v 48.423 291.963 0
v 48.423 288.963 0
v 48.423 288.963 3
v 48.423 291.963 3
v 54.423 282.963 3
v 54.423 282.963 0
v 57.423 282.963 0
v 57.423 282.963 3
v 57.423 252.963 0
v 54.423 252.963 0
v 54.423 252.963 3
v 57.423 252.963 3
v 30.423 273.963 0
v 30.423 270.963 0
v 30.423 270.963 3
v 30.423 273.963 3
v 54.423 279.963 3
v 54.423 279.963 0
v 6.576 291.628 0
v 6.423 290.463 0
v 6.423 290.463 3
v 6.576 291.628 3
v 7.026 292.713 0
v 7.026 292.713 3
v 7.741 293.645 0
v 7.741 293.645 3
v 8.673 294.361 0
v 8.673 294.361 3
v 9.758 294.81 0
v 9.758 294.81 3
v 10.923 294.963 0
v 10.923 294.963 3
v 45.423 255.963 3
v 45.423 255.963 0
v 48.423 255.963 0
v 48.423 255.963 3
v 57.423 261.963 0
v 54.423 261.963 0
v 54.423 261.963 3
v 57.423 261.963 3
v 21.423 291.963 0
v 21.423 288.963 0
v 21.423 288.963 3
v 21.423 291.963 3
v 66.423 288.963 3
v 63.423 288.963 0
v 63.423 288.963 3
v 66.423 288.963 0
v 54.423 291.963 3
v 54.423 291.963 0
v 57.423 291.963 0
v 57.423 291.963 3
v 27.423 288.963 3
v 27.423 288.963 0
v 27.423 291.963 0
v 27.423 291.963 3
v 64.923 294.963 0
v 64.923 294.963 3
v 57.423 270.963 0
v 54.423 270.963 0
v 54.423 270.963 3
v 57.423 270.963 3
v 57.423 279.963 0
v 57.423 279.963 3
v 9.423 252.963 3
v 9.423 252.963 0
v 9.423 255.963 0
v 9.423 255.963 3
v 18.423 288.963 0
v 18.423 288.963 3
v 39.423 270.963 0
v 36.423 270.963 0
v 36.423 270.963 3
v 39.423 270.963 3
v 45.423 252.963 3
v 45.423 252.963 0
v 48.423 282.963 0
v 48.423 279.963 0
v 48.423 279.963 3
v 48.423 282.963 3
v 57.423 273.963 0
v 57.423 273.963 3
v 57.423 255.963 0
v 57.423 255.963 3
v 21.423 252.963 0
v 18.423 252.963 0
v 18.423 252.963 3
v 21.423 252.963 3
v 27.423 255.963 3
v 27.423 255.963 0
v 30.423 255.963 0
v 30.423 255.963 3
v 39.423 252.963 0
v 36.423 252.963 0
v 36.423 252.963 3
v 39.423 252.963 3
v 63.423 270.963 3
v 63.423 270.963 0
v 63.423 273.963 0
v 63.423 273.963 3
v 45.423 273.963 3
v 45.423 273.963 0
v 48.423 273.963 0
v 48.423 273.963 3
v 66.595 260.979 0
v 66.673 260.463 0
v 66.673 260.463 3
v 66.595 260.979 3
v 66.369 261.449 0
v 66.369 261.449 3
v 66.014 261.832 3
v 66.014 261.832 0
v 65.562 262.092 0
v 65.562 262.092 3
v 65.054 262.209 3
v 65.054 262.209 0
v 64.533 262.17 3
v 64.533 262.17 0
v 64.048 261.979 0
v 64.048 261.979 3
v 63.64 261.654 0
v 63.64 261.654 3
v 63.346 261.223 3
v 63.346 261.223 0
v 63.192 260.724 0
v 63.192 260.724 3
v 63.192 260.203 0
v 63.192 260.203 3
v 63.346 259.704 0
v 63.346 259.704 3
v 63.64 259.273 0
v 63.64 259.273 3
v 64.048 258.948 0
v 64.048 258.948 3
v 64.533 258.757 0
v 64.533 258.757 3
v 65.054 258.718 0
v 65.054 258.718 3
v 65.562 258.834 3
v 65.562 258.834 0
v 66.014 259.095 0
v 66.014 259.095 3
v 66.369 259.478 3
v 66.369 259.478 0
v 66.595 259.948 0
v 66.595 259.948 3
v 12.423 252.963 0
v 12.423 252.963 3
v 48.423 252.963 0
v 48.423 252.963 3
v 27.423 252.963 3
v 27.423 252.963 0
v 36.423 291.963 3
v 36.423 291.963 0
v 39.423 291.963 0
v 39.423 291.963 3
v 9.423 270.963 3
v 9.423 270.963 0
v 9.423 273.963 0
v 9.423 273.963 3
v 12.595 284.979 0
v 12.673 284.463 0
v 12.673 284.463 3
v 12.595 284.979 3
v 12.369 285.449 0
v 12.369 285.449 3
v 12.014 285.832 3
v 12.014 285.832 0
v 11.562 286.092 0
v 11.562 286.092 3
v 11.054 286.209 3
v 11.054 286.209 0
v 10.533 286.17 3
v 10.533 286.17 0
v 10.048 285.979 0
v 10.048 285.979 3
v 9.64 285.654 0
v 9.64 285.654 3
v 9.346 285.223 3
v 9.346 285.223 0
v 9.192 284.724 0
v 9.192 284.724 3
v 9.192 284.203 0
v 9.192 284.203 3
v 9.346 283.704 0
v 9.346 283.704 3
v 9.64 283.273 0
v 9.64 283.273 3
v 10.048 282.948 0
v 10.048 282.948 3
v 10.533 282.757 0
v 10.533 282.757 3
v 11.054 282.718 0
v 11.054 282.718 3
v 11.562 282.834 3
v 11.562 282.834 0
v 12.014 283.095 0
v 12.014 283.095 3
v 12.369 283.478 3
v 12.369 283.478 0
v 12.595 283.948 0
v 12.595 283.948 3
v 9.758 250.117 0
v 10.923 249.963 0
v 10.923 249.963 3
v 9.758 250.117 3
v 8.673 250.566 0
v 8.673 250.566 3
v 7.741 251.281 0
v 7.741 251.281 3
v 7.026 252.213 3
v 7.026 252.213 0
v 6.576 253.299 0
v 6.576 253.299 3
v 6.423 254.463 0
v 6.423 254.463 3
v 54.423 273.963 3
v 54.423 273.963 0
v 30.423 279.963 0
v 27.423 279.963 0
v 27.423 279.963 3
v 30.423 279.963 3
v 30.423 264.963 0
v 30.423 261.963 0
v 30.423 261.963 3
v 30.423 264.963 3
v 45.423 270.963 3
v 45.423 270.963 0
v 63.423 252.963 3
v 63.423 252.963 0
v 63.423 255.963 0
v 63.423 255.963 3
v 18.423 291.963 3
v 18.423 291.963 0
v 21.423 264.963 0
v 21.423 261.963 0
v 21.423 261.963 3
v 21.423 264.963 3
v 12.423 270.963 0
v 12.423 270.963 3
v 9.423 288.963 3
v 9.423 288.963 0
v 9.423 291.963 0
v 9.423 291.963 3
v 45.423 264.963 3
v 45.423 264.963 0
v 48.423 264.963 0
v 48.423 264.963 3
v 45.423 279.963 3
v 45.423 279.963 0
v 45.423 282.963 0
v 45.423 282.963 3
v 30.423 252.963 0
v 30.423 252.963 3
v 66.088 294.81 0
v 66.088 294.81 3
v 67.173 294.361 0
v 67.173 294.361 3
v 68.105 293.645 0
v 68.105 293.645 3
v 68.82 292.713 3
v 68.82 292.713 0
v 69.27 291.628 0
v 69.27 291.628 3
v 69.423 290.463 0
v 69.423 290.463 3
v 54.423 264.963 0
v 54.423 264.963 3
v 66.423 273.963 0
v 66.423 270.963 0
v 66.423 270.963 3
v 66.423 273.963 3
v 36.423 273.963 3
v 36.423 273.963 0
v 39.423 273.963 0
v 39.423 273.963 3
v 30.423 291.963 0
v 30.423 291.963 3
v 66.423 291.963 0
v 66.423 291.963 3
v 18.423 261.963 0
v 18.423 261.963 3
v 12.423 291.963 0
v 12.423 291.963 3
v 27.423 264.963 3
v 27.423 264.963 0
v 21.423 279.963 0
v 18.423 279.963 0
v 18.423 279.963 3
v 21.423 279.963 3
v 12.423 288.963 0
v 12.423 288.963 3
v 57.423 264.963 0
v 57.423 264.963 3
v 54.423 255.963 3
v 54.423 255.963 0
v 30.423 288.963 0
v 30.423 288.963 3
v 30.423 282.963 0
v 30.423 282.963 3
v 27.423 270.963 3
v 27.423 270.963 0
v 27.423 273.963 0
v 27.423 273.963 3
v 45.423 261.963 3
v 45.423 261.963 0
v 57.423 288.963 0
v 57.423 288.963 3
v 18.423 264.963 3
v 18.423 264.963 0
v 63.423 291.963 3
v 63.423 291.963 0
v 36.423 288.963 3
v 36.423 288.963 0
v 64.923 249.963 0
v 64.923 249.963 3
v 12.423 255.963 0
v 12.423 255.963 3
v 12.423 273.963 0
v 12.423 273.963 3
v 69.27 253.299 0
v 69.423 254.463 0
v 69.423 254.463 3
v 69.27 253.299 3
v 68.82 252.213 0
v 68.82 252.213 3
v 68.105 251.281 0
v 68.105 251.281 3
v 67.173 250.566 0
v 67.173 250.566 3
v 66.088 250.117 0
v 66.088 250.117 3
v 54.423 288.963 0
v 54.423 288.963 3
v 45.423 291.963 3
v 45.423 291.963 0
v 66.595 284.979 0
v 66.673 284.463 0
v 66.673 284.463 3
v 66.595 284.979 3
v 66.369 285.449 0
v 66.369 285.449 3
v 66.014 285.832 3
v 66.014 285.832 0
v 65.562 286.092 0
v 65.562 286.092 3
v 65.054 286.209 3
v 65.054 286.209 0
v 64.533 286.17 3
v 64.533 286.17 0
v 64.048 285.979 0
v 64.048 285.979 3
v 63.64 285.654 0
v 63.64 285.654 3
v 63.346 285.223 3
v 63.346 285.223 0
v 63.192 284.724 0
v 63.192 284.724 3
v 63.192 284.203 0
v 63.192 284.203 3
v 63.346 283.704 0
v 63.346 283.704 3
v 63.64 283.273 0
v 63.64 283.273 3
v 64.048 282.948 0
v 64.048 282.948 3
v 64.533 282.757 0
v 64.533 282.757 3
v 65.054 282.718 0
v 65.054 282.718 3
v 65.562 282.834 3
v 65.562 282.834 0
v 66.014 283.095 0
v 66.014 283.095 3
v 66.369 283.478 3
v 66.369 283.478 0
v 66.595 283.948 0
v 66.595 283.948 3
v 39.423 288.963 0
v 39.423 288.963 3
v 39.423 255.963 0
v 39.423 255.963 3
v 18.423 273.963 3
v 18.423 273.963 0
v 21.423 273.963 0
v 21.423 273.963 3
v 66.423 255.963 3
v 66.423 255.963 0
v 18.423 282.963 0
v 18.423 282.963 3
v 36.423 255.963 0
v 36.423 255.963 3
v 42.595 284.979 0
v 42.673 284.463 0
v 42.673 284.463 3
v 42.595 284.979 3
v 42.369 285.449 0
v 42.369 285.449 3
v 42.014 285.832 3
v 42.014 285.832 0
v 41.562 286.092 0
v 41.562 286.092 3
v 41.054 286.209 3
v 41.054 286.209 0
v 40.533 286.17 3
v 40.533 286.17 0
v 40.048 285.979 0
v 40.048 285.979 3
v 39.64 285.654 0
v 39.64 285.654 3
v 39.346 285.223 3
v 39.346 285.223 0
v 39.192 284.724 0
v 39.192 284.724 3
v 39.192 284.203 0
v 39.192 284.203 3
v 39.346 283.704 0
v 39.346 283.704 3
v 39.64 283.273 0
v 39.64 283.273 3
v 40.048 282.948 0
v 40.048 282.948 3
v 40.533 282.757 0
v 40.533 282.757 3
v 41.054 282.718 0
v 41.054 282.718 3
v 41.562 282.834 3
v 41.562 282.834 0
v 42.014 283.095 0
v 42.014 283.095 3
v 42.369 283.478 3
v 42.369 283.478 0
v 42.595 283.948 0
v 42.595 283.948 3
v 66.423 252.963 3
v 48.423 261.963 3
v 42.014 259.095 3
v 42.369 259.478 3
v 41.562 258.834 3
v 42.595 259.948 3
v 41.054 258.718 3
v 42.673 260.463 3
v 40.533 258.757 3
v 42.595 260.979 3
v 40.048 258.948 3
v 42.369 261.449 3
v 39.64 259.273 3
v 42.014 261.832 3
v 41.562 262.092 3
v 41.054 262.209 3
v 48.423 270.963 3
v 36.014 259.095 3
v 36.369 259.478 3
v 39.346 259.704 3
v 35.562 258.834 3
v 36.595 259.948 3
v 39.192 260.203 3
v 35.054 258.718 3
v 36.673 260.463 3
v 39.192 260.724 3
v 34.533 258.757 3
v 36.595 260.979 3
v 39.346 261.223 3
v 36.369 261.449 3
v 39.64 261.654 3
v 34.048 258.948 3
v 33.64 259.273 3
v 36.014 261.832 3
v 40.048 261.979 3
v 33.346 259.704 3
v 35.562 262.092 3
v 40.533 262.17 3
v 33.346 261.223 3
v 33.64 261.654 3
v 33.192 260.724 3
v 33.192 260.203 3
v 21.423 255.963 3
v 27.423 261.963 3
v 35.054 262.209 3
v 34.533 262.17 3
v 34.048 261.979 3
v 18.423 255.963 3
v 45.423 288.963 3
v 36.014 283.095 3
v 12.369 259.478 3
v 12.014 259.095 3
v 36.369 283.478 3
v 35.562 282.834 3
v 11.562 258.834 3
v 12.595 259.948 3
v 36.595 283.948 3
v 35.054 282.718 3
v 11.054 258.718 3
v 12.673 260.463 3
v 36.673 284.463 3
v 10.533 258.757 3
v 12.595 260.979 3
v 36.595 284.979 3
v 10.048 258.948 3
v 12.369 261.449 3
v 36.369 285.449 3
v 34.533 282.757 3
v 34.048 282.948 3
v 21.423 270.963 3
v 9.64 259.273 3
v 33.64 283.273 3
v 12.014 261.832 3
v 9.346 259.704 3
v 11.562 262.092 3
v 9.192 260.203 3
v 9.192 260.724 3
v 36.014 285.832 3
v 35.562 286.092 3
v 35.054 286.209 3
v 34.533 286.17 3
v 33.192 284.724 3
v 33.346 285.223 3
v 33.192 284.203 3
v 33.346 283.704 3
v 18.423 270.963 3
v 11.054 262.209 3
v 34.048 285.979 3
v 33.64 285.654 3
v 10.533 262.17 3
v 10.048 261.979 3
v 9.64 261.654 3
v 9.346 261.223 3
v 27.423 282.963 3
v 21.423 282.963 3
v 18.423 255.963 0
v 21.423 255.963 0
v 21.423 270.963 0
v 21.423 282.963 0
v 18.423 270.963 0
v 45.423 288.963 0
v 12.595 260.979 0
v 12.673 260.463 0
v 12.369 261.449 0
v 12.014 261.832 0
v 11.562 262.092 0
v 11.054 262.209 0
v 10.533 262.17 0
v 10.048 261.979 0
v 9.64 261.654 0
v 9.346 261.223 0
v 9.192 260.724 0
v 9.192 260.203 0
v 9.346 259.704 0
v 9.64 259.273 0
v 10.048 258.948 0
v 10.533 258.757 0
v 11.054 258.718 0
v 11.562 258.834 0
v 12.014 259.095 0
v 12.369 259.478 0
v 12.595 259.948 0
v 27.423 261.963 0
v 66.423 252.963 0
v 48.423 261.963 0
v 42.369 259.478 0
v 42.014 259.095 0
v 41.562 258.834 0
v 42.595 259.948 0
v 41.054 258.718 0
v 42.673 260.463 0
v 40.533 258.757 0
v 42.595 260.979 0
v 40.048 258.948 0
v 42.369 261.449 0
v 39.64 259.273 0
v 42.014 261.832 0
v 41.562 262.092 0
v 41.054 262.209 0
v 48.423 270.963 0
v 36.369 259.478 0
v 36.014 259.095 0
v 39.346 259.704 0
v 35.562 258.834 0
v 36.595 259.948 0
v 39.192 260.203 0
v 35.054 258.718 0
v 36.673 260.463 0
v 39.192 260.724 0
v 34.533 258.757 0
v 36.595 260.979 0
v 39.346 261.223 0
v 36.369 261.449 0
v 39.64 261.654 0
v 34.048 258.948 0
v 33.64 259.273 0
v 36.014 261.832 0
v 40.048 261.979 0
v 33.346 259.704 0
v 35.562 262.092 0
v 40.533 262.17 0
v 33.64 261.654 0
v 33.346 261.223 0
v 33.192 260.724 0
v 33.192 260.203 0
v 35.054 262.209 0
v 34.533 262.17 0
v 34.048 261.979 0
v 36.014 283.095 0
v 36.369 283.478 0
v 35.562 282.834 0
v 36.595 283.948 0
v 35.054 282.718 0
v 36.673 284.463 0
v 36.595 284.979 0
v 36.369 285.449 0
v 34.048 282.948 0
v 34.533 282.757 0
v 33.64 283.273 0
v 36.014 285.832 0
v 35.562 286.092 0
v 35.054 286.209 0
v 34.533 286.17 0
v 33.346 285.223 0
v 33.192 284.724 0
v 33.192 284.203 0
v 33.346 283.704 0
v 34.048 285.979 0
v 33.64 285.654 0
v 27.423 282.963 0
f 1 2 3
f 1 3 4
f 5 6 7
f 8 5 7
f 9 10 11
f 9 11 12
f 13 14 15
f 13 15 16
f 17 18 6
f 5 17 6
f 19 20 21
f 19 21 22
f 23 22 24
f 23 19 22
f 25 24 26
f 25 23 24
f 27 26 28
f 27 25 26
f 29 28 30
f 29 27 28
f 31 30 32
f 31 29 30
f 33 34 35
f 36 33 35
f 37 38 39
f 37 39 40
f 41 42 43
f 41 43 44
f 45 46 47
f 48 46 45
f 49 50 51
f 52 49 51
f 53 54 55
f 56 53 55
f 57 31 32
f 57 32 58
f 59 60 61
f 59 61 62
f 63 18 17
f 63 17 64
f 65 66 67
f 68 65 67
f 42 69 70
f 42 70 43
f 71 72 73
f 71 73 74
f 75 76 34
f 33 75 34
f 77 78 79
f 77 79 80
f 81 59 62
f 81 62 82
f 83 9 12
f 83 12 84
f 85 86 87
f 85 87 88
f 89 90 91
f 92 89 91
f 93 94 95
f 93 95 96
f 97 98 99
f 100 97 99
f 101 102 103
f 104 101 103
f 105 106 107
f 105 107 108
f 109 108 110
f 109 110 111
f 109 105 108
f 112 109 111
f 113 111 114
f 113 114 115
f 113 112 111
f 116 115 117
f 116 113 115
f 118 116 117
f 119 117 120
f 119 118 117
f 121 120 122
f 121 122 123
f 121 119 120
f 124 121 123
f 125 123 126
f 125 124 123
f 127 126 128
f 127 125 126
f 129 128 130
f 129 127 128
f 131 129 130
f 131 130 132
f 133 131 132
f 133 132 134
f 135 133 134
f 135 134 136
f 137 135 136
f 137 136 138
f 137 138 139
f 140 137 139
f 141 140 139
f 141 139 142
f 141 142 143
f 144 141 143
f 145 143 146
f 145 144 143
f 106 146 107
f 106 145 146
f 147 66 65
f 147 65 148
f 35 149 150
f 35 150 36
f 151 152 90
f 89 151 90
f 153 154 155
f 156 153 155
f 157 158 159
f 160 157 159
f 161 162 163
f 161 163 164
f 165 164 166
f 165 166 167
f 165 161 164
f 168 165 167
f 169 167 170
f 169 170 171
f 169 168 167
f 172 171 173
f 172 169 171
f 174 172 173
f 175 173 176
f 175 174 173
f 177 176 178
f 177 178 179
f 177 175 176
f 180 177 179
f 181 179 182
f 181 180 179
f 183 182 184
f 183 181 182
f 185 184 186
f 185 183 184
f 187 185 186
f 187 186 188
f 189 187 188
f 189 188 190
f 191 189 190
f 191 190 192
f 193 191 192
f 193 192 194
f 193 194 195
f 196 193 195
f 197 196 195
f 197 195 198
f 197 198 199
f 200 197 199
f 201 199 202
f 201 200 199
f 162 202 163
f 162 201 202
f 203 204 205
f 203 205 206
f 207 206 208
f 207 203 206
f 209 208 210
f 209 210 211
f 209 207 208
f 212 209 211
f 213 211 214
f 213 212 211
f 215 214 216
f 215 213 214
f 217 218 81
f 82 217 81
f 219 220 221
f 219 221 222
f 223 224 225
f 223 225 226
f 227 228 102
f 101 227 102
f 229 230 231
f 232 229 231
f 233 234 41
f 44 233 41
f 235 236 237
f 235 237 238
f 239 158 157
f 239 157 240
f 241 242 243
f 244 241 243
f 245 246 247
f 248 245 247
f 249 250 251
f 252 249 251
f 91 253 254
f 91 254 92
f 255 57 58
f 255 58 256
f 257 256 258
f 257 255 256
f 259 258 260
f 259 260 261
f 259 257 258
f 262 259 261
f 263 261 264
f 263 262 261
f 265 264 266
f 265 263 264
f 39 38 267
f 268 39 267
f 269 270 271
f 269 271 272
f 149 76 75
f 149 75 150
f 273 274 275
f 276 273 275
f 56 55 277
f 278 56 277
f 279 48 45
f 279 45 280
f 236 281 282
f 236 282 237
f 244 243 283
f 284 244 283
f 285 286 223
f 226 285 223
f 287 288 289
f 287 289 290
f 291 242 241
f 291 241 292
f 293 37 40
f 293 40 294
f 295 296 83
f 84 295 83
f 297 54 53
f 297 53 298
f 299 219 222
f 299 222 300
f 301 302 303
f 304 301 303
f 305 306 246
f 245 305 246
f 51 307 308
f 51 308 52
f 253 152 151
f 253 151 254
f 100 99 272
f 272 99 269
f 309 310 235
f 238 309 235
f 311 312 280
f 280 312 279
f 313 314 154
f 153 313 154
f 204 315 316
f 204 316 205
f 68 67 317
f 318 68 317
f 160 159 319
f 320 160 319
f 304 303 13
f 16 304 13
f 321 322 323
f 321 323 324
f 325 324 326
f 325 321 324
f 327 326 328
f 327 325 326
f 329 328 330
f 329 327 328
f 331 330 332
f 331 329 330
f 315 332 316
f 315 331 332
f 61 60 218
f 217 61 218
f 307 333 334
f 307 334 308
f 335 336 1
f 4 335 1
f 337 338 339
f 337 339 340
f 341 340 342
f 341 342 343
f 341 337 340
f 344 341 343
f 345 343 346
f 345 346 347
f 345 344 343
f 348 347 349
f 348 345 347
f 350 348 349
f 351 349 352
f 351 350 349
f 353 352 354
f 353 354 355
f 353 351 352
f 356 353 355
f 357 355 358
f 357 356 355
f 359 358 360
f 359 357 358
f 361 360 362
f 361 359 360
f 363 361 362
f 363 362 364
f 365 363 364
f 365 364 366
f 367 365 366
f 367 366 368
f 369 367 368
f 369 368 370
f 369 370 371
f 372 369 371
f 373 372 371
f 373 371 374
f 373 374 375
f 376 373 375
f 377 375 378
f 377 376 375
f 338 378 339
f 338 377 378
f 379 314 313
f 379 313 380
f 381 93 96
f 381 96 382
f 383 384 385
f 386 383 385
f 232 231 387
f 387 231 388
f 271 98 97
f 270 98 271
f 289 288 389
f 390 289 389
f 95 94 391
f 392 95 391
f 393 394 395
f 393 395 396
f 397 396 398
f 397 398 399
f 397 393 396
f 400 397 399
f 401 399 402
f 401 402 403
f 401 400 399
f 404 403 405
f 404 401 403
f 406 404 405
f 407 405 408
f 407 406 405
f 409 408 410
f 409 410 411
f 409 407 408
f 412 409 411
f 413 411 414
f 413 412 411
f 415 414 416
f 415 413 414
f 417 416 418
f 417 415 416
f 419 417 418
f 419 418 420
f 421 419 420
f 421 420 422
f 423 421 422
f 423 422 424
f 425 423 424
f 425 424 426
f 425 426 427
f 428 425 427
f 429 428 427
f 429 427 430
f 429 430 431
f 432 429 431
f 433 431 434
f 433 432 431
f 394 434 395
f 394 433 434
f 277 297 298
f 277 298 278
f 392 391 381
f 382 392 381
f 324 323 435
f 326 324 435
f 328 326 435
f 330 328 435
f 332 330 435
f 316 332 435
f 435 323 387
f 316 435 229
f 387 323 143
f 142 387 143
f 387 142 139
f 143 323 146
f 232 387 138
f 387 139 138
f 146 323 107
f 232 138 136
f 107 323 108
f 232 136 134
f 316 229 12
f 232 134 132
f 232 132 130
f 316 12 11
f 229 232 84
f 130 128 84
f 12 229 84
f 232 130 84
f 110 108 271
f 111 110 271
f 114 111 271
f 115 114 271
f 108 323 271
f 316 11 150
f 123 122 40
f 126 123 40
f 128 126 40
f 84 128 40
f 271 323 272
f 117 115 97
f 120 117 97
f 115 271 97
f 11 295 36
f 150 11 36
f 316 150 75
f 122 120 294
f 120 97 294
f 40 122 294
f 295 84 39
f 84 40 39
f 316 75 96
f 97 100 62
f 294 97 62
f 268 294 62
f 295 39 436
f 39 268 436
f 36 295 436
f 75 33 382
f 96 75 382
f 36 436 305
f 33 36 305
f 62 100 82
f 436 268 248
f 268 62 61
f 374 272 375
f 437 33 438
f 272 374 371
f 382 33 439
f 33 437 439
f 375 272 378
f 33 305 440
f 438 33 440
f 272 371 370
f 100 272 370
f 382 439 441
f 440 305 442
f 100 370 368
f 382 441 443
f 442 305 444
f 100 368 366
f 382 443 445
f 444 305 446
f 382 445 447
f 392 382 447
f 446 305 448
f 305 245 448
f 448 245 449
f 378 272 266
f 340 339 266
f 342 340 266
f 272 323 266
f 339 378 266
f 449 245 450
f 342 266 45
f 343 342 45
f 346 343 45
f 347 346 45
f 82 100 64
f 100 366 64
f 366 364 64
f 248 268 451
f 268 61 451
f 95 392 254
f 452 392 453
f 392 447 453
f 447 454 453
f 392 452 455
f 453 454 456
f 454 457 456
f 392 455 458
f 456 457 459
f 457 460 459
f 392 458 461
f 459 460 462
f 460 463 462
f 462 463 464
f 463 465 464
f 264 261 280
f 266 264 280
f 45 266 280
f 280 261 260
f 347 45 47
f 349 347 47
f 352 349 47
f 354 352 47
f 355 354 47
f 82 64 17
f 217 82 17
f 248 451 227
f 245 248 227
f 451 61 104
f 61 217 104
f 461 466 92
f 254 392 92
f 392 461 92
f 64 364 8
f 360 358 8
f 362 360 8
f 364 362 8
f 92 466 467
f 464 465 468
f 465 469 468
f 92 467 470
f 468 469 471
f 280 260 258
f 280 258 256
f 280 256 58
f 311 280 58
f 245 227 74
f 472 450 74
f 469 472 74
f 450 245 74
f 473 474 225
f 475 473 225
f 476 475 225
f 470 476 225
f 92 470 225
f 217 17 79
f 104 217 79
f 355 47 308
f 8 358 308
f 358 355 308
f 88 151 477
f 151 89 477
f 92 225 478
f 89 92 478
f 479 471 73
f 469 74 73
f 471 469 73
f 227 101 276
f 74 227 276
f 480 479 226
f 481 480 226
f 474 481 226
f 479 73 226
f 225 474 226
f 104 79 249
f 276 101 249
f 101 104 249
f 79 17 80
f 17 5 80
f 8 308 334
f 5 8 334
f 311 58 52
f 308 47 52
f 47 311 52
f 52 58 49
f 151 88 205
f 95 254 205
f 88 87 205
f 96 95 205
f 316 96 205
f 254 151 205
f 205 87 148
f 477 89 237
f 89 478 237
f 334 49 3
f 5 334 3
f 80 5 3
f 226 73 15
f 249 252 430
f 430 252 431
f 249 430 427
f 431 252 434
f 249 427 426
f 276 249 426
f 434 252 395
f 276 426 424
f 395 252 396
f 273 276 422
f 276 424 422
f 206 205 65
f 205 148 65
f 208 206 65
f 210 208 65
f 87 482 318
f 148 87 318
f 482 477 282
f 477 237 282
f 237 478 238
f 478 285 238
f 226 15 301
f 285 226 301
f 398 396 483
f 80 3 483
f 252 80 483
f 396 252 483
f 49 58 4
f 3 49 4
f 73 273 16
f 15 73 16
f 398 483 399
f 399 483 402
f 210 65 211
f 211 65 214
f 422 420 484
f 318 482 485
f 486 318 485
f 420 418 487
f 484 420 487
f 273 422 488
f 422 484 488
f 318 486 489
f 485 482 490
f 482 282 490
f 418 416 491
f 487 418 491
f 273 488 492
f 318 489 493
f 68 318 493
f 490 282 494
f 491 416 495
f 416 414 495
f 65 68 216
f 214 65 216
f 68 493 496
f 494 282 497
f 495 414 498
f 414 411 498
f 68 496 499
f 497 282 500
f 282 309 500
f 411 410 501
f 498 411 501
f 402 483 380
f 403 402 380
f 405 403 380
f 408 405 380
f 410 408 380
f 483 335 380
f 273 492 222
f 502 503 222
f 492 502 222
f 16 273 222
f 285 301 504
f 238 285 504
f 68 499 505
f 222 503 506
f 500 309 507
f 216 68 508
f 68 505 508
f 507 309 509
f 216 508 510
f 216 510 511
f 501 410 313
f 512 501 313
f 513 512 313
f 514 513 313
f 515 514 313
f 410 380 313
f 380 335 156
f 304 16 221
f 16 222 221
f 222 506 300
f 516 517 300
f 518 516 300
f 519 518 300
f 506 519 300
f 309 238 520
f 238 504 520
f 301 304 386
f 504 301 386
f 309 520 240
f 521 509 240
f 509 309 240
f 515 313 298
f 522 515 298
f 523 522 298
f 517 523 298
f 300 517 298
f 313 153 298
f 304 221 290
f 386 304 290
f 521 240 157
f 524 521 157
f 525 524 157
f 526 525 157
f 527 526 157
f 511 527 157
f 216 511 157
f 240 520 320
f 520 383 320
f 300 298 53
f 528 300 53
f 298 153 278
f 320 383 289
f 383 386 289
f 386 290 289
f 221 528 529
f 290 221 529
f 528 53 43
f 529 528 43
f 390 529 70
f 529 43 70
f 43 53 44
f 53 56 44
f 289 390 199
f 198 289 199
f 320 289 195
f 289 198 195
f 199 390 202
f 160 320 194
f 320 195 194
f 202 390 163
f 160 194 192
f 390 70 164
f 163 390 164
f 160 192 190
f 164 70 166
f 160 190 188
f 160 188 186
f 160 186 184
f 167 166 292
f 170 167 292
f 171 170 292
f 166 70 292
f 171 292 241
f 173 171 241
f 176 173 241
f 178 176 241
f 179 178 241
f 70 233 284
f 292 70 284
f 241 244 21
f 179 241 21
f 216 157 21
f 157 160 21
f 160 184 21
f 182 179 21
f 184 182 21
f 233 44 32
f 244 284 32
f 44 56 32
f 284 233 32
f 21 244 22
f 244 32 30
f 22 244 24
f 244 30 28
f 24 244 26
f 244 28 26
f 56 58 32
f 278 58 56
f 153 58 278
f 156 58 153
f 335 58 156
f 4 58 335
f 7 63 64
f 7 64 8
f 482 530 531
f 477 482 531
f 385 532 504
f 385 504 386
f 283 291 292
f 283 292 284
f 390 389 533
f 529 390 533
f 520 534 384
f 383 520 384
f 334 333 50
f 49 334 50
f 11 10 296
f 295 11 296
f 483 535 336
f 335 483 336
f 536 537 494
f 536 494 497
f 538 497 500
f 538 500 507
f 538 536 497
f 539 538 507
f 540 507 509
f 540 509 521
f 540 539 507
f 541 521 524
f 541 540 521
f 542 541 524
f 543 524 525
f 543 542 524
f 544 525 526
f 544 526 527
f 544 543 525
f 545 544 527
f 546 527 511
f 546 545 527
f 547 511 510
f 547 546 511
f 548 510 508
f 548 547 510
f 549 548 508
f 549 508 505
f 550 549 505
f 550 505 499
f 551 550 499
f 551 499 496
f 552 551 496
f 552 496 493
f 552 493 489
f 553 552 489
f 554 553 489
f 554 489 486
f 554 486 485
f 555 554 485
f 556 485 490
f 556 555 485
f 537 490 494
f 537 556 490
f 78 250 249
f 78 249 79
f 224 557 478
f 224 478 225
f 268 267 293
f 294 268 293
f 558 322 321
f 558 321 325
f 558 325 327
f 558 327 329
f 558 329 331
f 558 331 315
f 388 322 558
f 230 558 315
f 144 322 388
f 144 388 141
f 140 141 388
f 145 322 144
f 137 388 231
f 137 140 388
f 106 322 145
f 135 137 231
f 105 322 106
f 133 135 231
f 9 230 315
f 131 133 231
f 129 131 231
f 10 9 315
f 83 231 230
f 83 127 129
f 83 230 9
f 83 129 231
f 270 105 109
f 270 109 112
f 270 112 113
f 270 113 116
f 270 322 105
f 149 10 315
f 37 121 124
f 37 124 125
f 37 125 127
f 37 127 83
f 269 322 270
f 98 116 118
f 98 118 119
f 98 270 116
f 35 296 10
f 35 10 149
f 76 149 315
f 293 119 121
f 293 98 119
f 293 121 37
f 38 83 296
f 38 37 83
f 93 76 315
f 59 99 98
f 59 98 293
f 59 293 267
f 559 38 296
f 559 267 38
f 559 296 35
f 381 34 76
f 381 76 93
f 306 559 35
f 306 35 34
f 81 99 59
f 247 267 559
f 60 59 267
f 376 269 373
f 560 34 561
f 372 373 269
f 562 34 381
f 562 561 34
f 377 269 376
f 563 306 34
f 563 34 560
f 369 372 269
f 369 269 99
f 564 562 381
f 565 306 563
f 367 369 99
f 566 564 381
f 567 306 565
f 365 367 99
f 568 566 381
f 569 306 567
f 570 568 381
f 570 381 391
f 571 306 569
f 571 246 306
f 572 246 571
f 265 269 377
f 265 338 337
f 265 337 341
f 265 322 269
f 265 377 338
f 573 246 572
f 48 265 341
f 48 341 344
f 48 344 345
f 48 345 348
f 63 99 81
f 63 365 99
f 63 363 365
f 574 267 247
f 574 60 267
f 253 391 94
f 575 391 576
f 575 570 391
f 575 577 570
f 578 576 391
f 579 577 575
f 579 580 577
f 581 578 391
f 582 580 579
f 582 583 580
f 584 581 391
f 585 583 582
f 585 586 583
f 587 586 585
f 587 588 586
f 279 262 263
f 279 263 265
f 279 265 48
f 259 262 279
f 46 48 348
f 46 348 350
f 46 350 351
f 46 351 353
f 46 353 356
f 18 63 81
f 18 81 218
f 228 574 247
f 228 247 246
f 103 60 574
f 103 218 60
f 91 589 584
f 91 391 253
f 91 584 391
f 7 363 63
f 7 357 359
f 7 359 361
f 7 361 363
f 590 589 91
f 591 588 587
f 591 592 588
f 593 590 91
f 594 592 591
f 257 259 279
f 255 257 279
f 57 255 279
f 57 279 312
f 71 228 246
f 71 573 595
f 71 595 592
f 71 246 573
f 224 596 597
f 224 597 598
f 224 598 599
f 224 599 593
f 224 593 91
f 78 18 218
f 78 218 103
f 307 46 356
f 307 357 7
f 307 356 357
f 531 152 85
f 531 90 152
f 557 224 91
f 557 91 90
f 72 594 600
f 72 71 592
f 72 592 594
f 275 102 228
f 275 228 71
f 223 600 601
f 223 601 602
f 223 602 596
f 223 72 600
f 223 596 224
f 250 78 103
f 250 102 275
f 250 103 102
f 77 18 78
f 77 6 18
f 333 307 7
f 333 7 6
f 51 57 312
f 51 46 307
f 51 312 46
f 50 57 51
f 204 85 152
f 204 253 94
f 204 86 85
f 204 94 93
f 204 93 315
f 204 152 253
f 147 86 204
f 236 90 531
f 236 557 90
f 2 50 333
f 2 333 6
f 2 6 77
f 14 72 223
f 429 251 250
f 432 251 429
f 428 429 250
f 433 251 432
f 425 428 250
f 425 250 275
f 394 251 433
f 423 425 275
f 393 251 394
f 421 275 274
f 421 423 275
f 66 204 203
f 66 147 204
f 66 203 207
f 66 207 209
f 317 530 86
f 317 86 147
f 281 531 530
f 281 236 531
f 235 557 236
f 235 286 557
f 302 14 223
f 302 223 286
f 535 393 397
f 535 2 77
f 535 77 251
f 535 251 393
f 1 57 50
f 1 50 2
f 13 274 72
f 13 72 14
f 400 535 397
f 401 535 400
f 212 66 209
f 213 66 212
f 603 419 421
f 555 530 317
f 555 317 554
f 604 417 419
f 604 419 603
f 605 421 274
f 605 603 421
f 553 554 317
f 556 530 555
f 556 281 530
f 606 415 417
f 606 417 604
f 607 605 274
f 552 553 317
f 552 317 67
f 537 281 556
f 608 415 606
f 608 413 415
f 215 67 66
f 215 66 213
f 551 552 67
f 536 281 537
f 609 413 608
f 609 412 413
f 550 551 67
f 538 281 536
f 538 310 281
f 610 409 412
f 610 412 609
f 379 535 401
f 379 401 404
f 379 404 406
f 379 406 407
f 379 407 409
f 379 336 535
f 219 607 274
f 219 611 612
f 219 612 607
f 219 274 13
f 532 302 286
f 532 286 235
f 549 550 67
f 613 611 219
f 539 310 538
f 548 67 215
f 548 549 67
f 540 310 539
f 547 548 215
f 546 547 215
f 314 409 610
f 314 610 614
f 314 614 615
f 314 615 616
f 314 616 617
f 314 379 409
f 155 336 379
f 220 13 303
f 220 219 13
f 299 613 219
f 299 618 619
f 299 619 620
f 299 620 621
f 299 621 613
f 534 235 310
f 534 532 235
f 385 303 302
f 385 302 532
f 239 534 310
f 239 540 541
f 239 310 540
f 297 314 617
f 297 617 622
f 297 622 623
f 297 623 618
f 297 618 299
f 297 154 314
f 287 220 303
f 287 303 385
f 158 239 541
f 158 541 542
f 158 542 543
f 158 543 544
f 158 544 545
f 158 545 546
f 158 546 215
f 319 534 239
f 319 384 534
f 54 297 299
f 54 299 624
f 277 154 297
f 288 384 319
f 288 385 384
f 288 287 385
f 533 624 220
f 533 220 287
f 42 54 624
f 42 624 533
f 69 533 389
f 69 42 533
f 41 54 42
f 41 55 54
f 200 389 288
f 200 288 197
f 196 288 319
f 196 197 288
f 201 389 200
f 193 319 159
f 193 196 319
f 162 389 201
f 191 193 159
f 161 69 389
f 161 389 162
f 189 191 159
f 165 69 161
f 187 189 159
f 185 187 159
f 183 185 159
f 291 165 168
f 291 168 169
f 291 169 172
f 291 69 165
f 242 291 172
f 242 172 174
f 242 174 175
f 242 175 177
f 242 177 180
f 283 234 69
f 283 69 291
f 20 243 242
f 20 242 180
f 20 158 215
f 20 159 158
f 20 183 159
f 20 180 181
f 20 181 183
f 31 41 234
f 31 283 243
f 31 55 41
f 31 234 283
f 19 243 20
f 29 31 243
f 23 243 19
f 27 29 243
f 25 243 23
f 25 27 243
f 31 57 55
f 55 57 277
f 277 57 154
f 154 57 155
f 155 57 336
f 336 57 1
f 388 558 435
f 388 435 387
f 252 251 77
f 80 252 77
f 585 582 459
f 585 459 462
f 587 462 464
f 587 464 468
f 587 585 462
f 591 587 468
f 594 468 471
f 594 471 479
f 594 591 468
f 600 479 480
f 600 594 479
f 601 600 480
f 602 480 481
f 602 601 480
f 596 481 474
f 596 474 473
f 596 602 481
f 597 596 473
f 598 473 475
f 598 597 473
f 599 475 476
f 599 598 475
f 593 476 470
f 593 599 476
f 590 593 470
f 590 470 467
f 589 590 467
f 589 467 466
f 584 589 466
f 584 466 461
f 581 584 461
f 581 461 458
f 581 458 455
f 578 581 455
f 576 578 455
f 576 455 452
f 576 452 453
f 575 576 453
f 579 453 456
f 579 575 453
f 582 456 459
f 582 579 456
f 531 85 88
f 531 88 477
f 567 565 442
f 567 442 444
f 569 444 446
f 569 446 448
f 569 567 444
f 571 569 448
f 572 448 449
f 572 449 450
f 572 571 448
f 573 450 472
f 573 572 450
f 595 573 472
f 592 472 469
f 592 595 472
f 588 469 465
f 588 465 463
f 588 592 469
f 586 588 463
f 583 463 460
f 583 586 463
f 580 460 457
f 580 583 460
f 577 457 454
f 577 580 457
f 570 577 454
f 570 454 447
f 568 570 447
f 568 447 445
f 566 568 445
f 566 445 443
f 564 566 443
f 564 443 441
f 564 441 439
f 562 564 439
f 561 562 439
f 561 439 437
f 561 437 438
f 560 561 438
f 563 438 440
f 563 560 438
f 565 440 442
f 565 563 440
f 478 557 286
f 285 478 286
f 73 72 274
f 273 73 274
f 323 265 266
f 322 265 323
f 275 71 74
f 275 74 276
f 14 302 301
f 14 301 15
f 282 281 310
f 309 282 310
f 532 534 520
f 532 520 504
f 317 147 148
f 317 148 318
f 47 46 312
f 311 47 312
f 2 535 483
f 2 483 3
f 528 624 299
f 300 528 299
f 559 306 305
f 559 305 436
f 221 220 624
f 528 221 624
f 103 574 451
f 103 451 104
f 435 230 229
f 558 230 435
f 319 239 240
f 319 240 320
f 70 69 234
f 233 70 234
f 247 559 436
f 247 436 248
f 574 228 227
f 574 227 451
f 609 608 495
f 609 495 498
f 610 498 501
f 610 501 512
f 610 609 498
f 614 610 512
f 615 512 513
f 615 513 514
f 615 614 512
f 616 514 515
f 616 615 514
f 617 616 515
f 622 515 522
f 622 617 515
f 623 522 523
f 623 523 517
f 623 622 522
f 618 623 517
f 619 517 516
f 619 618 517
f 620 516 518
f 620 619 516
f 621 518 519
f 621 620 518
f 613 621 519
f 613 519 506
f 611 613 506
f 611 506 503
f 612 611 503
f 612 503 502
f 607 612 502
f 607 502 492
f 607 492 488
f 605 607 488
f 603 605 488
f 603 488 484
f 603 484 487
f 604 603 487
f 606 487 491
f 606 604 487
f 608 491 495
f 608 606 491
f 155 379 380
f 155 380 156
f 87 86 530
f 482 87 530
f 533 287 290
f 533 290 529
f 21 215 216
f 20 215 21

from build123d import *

# Parameters (mm, degrees)
MODEL_R                 = 1.75
MODEL_W                 = 3
MODEL_H                 = 3
MODEL_W_2               = 3.000000001
SALIENTE_EXTRUIR1_DEPTH = 3


with BuildPart() as part:
    # Model → Saliente-Extruir1 (new body)
    with BuildSketch(Plane.XY):
        with BuildLine():
            Line((10.922877124, 294.963401588), (64.922877125, 294.963401588))
            ThreePointArc((64.922877125, 294.963401588), (68.10485764, 293.645382103), (69.422877125, 290.463401588))
            Line((69.422877125, 290.463401588), (69.422877125, 254.463401588))
            ThreePointArc((69.422877125, 254.463401588), (68.10485764, 251.281421073), (64.922877125, 249.963401588))
            Line((64.922877125, 249.963401588), (10.922877124, 249.963401588))
            ThreePointArc((10.922877124, 249.963401588), (7.740896609, 251.281421073), (6.422877125, 254.463401588))
            Line((6.422877125, 254.463401588), (6.422877125, 290.463401588))
            ThreePointArc((6.422877125, 290.463401588), (7.740896609, 293.645382103), (10.922877124, 294.963401588))
        make_face()
        with Locations((64.922877125, 284.463401588)):
            Circle(MODEL_R, mode=Mode.SUBTRACT)
        with Locations((34.922877124, 284.463401588)):
            Circle(MODEL_R, mode=Mode.SUBTRACT)
        with Locations((64.922877125, 260.463401588)):
            Circle(MODEL_R, mode=Mode.SUBTRACT)
        with Locations((34.922877124, 260.463401588)):
            Circle(MODEL_R, mode=Mode.SUBTRACT)
        with Locations((40.922877124, 284.463401588)):
            Circle(MODEL_R, mode=Mode.SUBTRACT)
        with Locations((10.922877124, 284.463401588)):
            Circle(MODEL_R, mode=Mode.SUBTRACT)
        with Locations((40.922877124, 260.463401588)):
            Circle(MODEL_R, mode=Mode.SUBTRACT)
        with Locations((10.922877124, 260.463401588)):
            Circle(MODEL_R, mode=Mode.SUBTRACT)
        with Locations((10.922877124, 290.463401588)):
            Rectangle(MODEL_W, MODEL_H, mode=Mode.SUBTRACT)
        with Locations((19.922877124, 290.463401588)):
            Rectangle(MODEL_W, MODEL_H, mode=Mode.SUBTRACT)
        with Locations((28.922877124, 290.463401588)):
            Rectangle(MODEL_W, MODEL_H, mode=Mode.SUBTRACT)
        with Locations((55.922877124, 290.463401588)):
            Rectangle(MODEL_W, MODEL_H, mode=Mode.SUBTRACT)
        with Locations((64.922877125, 290.463401588)):
            Rectangle(MODEL_W_2, MODEL_H, mode=Mode.SUBTRACT)
        with Locations((10.922877124, 254.463401588)):
            Rectangle(MODEL_W, MODEL_H, mode=Mode.SUBTRACT)
        with Locations((19.922877124, 254.463401588)):
            Rectangle(MODEL_W, MODEL_H, mode=Mode.SUBTRACT)
        with Locations((28.922877124, 254.463401588)):
            Rectangle(MODEL_W, MODEL_H, mode=Mode.SUBTRACT)
        with Locations((55.922877124, 254.463401588)):
            Rectangle(MODEL_W, MODEL_H, mode=Mode.SUBTRACT)
        with Locations((64.922877125, 254.463401588)):
            Rectangle(MODEL_W_2, MODEL_H, mode=Mode.SUBTRACT)
        with Locations((19.922877124, 263.463401588)):
            Rectangle(MODEL_W, MODEL_H, mode=Mode.SUBTRACT)
        with Locations((28.922877124, 263.463401588)):
            Rectangle(MODEL_W, MODEL_H, mode=Mode.SUBTRACT)
        with Locations((55.922877124, 263.463401588)):
            Rectangle(MODEL_W, MODEL_H, mode=Mode.SUBTRACT)
        with Locations((37.922877124, 290.463401588)):
            Rectangle(MODEL_W, MODEL_H, mode=Mode.SUBTRACT)
        with Locations((46.922877124, 290.463401588)):
            Rectangle(MODEL_W, MODEL_H, mode=Mode.SUBTRACT)
        with Locations((37.922877124, 254.463401588)):
            Rectangle(MODEL_W, MODEL_H, mode=Mode.SUBTRACT)
        with Locations((46.922877124, 254.463401588)):
            Rectangle(MODEL_W, MODEL_H, mode=Mode.SUBTRACT)
        with Locations((46.922877124, 263.463401588)):
            Rectangle(MODEL_W, MODEL_H, mode=Mode.SUBTRACT)
        with Locations((10.922877124, 272.463401588)):
            Rectangle(MODEL_W, MODEL_H, mode=Mode.SUBTRACT)
        with Locations((19.922877124, 272.463401588)):
            Rectangle(MODEL_W, MODEL_H, mode=Mode.SUBTRACT)
        with Locations((28.922877124, 272.463401588)):
            Rectangle(MODEL_W, MODEL_H, mode=Mode.SUBTRACT)
        with Locations((55.922877124, 272.463401588)):
            Rectangle(MODEL_W, MODEL_H, mode=Mode.SUBTRACT)
        with Locations((64.922877125, 272.463401588)):
            Rectangle(MODEL_W_2, MODEL_H, mode=Mode.SUBTRACT)
        with Locations((19.922877124, 281.463401588)):
            Rectangle(MODEL_W, MODEL_H, mode=Mode.SUBTRACT)
        with Locations((28.922877124, 281.463401588)):
            Rectangle(MODEL_W, MODEL_H, mode=Mode.SUBTRACT)
        with Locations((55.922877124, 281.463401588)):
            Rectangle(MODEL_W, MODEL_H, mode=Mode.SUBTRACT)
        with Locations((37.922877124, 272.463401588)):
            Rectangle(MODEL_W, MODEL_H, mode=Mode.SUBTRACT)
        with Locations((46.922877124, 272.463401588)):
            Rectangle(MODEL_W, MODEL_H, mode=Mode.SUBTRACT)
        with Locations((46.922877124, 281.463401588)):
            Rectangle(MODEL_W, MODEL_H, mode=Mode.SUBTRACT)
    extrude(amount=SALIENTE_EXTRUIR1_DEPTH)


solid = part.part
